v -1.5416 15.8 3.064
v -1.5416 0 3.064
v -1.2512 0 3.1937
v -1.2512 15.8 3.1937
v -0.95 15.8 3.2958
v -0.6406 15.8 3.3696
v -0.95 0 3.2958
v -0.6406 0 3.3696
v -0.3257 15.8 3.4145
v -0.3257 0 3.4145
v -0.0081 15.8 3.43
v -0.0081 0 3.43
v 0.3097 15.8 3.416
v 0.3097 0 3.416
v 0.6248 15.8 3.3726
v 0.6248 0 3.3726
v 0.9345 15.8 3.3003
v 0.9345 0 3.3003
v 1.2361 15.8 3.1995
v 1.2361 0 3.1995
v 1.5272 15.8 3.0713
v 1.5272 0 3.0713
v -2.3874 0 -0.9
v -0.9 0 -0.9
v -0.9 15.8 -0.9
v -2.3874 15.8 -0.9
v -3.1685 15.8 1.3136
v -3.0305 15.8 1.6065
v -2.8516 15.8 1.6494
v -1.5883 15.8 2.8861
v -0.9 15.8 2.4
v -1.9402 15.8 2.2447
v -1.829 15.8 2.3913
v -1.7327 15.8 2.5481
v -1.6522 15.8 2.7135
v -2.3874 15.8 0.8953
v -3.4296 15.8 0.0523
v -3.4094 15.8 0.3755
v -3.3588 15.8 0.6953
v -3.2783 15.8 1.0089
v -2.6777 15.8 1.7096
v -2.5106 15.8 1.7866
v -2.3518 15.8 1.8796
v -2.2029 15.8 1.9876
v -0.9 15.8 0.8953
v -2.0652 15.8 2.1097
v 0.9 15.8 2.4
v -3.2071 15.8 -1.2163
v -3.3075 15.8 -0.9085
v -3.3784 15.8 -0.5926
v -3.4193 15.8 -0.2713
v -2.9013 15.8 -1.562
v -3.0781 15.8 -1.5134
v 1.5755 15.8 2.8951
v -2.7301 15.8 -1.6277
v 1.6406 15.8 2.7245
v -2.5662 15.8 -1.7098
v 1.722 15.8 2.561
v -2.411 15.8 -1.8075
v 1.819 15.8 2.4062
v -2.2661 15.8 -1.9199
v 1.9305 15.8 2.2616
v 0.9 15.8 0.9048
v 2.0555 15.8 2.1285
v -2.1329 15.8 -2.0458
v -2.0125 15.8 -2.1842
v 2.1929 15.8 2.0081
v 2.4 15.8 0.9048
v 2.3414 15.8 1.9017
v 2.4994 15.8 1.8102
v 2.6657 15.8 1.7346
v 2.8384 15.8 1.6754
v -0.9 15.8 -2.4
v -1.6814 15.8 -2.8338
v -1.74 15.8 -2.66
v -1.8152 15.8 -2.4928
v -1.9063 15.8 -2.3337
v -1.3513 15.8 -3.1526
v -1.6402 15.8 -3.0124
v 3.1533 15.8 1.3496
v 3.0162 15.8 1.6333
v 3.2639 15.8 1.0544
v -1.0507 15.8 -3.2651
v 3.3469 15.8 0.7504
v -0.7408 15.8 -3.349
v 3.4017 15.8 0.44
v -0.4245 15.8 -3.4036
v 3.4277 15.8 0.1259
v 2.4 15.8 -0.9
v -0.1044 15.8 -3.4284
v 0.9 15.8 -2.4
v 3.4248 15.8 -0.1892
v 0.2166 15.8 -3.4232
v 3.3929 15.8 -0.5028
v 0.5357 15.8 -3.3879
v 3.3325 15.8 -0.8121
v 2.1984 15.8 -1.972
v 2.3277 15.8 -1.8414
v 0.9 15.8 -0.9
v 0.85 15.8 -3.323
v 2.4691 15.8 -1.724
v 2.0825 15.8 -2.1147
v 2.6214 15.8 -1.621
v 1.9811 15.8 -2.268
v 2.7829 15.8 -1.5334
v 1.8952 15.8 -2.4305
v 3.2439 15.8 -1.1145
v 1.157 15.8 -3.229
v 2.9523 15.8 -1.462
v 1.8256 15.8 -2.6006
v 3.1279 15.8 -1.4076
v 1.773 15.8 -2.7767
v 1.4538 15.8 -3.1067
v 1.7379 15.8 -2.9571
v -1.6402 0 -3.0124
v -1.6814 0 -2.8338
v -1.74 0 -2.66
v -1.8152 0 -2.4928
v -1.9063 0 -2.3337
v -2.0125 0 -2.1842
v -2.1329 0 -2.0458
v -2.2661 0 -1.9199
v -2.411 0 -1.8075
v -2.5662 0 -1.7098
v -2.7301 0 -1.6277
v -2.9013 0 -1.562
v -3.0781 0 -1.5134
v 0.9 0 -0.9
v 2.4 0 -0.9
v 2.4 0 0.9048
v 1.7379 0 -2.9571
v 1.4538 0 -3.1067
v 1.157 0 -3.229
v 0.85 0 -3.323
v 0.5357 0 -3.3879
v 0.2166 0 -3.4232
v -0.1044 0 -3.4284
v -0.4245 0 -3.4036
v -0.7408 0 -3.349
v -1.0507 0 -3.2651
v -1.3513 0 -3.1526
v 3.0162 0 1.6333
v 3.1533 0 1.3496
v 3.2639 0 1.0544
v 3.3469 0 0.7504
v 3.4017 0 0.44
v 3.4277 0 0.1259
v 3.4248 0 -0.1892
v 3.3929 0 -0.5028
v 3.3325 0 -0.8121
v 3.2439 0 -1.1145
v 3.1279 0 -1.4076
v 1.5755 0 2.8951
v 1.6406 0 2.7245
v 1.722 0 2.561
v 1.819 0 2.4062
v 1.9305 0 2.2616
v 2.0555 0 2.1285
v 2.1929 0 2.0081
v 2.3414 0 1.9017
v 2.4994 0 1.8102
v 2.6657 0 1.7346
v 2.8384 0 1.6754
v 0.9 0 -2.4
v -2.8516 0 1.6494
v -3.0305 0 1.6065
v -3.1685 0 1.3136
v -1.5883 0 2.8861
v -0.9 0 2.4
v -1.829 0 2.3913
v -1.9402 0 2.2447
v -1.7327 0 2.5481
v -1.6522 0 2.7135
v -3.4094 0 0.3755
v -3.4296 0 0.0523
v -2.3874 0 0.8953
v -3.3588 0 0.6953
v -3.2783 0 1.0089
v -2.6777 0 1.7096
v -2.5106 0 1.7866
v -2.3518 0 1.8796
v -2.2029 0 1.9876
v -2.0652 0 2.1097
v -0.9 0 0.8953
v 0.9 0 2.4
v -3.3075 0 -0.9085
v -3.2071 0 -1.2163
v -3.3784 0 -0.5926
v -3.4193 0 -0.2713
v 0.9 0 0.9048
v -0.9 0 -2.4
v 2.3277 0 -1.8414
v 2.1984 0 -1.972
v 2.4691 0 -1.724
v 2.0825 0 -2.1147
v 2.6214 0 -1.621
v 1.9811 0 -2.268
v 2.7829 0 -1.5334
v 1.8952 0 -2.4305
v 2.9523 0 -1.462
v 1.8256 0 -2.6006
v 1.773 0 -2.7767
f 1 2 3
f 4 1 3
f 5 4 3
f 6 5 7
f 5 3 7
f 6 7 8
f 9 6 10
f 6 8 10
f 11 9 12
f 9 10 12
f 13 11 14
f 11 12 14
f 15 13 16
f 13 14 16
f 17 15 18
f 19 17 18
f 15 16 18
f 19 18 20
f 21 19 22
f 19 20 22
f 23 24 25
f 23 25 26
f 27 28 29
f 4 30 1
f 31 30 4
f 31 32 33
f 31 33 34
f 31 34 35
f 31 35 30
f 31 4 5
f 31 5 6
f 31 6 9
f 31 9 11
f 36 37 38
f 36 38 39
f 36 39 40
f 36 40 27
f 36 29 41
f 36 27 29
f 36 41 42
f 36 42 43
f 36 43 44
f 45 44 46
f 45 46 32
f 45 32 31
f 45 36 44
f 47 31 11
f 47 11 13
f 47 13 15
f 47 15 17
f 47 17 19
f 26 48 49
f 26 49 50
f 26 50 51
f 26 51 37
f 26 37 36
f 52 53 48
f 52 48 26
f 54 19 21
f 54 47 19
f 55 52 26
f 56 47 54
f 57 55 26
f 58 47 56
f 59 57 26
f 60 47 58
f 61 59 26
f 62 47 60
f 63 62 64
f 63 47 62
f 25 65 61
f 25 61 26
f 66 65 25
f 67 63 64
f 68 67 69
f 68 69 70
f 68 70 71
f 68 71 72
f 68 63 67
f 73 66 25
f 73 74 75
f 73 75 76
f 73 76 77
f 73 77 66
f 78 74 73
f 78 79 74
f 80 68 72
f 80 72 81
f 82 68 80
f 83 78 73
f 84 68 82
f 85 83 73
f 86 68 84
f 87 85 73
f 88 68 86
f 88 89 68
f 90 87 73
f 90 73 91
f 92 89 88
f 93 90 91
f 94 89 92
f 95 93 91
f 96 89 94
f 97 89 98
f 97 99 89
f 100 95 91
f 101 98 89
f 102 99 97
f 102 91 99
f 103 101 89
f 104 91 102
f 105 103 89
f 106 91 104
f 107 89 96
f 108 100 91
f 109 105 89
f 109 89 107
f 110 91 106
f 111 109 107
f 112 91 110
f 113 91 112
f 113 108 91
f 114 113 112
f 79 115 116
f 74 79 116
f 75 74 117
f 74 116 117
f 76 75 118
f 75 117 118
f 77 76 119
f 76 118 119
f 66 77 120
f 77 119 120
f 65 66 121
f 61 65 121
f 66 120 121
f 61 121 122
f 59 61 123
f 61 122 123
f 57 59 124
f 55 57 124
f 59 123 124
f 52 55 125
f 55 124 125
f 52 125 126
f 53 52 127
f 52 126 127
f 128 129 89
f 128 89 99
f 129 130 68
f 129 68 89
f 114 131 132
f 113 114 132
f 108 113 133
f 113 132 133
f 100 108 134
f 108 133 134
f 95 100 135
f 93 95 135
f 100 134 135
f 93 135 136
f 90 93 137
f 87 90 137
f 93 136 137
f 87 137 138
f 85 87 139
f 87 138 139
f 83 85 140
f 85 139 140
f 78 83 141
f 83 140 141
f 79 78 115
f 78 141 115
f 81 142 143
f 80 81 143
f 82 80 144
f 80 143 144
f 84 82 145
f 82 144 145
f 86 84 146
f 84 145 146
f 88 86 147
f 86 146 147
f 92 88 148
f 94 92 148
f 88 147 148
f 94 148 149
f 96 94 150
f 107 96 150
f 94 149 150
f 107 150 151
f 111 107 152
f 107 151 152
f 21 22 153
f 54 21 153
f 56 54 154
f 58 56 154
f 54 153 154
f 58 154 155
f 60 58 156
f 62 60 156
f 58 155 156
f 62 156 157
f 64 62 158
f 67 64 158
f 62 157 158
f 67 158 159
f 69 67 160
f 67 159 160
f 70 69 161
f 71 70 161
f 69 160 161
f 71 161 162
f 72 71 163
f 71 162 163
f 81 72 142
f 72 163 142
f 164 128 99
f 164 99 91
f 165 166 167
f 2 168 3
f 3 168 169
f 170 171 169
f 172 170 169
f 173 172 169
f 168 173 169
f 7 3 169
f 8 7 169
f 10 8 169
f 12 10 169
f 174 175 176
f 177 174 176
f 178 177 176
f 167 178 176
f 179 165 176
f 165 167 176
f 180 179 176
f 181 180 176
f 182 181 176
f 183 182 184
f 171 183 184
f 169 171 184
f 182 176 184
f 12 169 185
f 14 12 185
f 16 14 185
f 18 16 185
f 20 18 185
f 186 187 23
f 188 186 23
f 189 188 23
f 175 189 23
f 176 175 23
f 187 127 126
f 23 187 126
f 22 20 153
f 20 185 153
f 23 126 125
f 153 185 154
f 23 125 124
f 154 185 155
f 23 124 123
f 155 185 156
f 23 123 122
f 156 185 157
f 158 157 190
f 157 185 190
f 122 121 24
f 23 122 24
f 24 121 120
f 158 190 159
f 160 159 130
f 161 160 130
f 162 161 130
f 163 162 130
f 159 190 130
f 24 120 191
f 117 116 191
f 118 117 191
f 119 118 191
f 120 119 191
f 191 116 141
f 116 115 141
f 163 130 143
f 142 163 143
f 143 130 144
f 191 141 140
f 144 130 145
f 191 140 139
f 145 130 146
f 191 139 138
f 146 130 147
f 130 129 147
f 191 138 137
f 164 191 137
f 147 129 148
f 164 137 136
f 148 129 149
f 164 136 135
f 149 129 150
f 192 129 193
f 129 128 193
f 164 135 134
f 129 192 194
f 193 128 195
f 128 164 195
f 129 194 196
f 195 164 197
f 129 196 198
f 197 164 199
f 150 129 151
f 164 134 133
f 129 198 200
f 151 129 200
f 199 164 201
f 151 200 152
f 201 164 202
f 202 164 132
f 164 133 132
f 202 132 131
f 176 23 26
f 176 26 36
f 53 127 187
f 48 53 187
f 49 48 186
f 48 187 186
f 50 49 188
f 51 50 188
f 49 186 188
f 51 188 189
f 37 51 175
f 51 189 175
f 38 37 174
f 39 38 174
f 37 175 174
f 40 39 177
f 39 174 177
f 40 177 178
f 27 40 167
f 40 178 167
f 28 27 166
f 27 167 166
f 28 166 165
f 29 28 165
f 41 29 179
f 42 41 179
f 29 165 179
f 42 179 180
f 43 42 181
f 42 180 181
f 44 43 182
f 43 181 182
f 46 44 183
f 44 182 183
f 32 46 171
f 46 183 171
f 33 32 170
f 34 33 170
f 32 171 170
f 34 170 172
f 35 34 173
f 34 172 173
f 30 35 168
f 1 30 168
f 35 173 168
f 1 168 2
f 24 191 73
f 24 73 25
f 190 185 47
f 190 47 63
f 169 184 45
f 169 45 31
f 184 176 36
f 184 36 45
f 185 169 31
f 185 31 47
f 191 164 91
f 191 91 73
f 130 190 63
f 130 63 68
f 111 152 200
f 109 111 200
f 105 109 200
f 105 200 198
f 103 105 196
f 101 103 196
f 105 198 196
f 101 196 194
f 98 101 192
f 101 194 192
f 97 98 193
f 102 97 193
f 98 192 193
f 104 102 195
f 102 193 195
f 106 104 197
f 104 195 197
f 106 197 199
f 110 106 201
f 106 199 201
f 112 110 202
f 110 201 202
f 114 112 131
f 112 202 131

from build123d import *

# Parameters (mm, degrees)
BOSS_EXTRUDE1_DEPTH = 15.8


with BuildPart() as part:
    # Sketch1 → Boss-Extrude1 (new body)
    with BuildSketch(Plane(origin=(0, 0, 0), x_dir=(1, 0, 0), z_dir=(0, 1, 0))):
        with BuildLine():
            ThreePointArc((-3.07809394, 1.513353131), (-3.429601206, -0.052302649), (-3.030514882, -1.606511608))
            ThreePointArc((-3.030514882, -1.606511608), (-2.065248113, -2.109713097), (-1.541602156, -3.064043536))
            ThreePointArc((-1.541602156, -3.064043536), (-0.008059447, -3.429990531), (1.52718605, -3.071254266))
            ThreePointArc((1.52718605, -3.071254266), (2.055535434, -2.128465), (3.016165269, -1.633293321))
            ThreePointArc((3.016165269, -1.633293321), (3.427687897, -0.12591933), (3.127874832, 1.407586245))
            ThreePointArc((3.127874832, 1.407586245), (2.198390326, 1.972019011), (1.737882905, 2.957137637))
            ThreePointArc((1.737882905, 2.957137637), (0.056138347, 3.429540565), (-1.640166658, 3.012433125))
            ThreePointArc((-1.640166658, 3.012433125), (-2.132855627, 2.045848991), (-3.07809394, 1.513353131))
        make_face()
        Polygon((-0.9, -0.895266893), (-0.9, -2.4), (0.9, -2.4), (0.9, -0.90475813), (2.4, -0.90475813), (2.4, 0.9), (0.9, 0.9), (0.9, 2.4), (-0.9, 2.4), (-0.9, 0.9), (-2.387378381, 0.9), (-2.387378381, -0.895266893), align=None, mode=Mode.SUBTRACT)
    extrude(amount=BOSS_EXTRUDE1_DEPTH)


solid = part.part
